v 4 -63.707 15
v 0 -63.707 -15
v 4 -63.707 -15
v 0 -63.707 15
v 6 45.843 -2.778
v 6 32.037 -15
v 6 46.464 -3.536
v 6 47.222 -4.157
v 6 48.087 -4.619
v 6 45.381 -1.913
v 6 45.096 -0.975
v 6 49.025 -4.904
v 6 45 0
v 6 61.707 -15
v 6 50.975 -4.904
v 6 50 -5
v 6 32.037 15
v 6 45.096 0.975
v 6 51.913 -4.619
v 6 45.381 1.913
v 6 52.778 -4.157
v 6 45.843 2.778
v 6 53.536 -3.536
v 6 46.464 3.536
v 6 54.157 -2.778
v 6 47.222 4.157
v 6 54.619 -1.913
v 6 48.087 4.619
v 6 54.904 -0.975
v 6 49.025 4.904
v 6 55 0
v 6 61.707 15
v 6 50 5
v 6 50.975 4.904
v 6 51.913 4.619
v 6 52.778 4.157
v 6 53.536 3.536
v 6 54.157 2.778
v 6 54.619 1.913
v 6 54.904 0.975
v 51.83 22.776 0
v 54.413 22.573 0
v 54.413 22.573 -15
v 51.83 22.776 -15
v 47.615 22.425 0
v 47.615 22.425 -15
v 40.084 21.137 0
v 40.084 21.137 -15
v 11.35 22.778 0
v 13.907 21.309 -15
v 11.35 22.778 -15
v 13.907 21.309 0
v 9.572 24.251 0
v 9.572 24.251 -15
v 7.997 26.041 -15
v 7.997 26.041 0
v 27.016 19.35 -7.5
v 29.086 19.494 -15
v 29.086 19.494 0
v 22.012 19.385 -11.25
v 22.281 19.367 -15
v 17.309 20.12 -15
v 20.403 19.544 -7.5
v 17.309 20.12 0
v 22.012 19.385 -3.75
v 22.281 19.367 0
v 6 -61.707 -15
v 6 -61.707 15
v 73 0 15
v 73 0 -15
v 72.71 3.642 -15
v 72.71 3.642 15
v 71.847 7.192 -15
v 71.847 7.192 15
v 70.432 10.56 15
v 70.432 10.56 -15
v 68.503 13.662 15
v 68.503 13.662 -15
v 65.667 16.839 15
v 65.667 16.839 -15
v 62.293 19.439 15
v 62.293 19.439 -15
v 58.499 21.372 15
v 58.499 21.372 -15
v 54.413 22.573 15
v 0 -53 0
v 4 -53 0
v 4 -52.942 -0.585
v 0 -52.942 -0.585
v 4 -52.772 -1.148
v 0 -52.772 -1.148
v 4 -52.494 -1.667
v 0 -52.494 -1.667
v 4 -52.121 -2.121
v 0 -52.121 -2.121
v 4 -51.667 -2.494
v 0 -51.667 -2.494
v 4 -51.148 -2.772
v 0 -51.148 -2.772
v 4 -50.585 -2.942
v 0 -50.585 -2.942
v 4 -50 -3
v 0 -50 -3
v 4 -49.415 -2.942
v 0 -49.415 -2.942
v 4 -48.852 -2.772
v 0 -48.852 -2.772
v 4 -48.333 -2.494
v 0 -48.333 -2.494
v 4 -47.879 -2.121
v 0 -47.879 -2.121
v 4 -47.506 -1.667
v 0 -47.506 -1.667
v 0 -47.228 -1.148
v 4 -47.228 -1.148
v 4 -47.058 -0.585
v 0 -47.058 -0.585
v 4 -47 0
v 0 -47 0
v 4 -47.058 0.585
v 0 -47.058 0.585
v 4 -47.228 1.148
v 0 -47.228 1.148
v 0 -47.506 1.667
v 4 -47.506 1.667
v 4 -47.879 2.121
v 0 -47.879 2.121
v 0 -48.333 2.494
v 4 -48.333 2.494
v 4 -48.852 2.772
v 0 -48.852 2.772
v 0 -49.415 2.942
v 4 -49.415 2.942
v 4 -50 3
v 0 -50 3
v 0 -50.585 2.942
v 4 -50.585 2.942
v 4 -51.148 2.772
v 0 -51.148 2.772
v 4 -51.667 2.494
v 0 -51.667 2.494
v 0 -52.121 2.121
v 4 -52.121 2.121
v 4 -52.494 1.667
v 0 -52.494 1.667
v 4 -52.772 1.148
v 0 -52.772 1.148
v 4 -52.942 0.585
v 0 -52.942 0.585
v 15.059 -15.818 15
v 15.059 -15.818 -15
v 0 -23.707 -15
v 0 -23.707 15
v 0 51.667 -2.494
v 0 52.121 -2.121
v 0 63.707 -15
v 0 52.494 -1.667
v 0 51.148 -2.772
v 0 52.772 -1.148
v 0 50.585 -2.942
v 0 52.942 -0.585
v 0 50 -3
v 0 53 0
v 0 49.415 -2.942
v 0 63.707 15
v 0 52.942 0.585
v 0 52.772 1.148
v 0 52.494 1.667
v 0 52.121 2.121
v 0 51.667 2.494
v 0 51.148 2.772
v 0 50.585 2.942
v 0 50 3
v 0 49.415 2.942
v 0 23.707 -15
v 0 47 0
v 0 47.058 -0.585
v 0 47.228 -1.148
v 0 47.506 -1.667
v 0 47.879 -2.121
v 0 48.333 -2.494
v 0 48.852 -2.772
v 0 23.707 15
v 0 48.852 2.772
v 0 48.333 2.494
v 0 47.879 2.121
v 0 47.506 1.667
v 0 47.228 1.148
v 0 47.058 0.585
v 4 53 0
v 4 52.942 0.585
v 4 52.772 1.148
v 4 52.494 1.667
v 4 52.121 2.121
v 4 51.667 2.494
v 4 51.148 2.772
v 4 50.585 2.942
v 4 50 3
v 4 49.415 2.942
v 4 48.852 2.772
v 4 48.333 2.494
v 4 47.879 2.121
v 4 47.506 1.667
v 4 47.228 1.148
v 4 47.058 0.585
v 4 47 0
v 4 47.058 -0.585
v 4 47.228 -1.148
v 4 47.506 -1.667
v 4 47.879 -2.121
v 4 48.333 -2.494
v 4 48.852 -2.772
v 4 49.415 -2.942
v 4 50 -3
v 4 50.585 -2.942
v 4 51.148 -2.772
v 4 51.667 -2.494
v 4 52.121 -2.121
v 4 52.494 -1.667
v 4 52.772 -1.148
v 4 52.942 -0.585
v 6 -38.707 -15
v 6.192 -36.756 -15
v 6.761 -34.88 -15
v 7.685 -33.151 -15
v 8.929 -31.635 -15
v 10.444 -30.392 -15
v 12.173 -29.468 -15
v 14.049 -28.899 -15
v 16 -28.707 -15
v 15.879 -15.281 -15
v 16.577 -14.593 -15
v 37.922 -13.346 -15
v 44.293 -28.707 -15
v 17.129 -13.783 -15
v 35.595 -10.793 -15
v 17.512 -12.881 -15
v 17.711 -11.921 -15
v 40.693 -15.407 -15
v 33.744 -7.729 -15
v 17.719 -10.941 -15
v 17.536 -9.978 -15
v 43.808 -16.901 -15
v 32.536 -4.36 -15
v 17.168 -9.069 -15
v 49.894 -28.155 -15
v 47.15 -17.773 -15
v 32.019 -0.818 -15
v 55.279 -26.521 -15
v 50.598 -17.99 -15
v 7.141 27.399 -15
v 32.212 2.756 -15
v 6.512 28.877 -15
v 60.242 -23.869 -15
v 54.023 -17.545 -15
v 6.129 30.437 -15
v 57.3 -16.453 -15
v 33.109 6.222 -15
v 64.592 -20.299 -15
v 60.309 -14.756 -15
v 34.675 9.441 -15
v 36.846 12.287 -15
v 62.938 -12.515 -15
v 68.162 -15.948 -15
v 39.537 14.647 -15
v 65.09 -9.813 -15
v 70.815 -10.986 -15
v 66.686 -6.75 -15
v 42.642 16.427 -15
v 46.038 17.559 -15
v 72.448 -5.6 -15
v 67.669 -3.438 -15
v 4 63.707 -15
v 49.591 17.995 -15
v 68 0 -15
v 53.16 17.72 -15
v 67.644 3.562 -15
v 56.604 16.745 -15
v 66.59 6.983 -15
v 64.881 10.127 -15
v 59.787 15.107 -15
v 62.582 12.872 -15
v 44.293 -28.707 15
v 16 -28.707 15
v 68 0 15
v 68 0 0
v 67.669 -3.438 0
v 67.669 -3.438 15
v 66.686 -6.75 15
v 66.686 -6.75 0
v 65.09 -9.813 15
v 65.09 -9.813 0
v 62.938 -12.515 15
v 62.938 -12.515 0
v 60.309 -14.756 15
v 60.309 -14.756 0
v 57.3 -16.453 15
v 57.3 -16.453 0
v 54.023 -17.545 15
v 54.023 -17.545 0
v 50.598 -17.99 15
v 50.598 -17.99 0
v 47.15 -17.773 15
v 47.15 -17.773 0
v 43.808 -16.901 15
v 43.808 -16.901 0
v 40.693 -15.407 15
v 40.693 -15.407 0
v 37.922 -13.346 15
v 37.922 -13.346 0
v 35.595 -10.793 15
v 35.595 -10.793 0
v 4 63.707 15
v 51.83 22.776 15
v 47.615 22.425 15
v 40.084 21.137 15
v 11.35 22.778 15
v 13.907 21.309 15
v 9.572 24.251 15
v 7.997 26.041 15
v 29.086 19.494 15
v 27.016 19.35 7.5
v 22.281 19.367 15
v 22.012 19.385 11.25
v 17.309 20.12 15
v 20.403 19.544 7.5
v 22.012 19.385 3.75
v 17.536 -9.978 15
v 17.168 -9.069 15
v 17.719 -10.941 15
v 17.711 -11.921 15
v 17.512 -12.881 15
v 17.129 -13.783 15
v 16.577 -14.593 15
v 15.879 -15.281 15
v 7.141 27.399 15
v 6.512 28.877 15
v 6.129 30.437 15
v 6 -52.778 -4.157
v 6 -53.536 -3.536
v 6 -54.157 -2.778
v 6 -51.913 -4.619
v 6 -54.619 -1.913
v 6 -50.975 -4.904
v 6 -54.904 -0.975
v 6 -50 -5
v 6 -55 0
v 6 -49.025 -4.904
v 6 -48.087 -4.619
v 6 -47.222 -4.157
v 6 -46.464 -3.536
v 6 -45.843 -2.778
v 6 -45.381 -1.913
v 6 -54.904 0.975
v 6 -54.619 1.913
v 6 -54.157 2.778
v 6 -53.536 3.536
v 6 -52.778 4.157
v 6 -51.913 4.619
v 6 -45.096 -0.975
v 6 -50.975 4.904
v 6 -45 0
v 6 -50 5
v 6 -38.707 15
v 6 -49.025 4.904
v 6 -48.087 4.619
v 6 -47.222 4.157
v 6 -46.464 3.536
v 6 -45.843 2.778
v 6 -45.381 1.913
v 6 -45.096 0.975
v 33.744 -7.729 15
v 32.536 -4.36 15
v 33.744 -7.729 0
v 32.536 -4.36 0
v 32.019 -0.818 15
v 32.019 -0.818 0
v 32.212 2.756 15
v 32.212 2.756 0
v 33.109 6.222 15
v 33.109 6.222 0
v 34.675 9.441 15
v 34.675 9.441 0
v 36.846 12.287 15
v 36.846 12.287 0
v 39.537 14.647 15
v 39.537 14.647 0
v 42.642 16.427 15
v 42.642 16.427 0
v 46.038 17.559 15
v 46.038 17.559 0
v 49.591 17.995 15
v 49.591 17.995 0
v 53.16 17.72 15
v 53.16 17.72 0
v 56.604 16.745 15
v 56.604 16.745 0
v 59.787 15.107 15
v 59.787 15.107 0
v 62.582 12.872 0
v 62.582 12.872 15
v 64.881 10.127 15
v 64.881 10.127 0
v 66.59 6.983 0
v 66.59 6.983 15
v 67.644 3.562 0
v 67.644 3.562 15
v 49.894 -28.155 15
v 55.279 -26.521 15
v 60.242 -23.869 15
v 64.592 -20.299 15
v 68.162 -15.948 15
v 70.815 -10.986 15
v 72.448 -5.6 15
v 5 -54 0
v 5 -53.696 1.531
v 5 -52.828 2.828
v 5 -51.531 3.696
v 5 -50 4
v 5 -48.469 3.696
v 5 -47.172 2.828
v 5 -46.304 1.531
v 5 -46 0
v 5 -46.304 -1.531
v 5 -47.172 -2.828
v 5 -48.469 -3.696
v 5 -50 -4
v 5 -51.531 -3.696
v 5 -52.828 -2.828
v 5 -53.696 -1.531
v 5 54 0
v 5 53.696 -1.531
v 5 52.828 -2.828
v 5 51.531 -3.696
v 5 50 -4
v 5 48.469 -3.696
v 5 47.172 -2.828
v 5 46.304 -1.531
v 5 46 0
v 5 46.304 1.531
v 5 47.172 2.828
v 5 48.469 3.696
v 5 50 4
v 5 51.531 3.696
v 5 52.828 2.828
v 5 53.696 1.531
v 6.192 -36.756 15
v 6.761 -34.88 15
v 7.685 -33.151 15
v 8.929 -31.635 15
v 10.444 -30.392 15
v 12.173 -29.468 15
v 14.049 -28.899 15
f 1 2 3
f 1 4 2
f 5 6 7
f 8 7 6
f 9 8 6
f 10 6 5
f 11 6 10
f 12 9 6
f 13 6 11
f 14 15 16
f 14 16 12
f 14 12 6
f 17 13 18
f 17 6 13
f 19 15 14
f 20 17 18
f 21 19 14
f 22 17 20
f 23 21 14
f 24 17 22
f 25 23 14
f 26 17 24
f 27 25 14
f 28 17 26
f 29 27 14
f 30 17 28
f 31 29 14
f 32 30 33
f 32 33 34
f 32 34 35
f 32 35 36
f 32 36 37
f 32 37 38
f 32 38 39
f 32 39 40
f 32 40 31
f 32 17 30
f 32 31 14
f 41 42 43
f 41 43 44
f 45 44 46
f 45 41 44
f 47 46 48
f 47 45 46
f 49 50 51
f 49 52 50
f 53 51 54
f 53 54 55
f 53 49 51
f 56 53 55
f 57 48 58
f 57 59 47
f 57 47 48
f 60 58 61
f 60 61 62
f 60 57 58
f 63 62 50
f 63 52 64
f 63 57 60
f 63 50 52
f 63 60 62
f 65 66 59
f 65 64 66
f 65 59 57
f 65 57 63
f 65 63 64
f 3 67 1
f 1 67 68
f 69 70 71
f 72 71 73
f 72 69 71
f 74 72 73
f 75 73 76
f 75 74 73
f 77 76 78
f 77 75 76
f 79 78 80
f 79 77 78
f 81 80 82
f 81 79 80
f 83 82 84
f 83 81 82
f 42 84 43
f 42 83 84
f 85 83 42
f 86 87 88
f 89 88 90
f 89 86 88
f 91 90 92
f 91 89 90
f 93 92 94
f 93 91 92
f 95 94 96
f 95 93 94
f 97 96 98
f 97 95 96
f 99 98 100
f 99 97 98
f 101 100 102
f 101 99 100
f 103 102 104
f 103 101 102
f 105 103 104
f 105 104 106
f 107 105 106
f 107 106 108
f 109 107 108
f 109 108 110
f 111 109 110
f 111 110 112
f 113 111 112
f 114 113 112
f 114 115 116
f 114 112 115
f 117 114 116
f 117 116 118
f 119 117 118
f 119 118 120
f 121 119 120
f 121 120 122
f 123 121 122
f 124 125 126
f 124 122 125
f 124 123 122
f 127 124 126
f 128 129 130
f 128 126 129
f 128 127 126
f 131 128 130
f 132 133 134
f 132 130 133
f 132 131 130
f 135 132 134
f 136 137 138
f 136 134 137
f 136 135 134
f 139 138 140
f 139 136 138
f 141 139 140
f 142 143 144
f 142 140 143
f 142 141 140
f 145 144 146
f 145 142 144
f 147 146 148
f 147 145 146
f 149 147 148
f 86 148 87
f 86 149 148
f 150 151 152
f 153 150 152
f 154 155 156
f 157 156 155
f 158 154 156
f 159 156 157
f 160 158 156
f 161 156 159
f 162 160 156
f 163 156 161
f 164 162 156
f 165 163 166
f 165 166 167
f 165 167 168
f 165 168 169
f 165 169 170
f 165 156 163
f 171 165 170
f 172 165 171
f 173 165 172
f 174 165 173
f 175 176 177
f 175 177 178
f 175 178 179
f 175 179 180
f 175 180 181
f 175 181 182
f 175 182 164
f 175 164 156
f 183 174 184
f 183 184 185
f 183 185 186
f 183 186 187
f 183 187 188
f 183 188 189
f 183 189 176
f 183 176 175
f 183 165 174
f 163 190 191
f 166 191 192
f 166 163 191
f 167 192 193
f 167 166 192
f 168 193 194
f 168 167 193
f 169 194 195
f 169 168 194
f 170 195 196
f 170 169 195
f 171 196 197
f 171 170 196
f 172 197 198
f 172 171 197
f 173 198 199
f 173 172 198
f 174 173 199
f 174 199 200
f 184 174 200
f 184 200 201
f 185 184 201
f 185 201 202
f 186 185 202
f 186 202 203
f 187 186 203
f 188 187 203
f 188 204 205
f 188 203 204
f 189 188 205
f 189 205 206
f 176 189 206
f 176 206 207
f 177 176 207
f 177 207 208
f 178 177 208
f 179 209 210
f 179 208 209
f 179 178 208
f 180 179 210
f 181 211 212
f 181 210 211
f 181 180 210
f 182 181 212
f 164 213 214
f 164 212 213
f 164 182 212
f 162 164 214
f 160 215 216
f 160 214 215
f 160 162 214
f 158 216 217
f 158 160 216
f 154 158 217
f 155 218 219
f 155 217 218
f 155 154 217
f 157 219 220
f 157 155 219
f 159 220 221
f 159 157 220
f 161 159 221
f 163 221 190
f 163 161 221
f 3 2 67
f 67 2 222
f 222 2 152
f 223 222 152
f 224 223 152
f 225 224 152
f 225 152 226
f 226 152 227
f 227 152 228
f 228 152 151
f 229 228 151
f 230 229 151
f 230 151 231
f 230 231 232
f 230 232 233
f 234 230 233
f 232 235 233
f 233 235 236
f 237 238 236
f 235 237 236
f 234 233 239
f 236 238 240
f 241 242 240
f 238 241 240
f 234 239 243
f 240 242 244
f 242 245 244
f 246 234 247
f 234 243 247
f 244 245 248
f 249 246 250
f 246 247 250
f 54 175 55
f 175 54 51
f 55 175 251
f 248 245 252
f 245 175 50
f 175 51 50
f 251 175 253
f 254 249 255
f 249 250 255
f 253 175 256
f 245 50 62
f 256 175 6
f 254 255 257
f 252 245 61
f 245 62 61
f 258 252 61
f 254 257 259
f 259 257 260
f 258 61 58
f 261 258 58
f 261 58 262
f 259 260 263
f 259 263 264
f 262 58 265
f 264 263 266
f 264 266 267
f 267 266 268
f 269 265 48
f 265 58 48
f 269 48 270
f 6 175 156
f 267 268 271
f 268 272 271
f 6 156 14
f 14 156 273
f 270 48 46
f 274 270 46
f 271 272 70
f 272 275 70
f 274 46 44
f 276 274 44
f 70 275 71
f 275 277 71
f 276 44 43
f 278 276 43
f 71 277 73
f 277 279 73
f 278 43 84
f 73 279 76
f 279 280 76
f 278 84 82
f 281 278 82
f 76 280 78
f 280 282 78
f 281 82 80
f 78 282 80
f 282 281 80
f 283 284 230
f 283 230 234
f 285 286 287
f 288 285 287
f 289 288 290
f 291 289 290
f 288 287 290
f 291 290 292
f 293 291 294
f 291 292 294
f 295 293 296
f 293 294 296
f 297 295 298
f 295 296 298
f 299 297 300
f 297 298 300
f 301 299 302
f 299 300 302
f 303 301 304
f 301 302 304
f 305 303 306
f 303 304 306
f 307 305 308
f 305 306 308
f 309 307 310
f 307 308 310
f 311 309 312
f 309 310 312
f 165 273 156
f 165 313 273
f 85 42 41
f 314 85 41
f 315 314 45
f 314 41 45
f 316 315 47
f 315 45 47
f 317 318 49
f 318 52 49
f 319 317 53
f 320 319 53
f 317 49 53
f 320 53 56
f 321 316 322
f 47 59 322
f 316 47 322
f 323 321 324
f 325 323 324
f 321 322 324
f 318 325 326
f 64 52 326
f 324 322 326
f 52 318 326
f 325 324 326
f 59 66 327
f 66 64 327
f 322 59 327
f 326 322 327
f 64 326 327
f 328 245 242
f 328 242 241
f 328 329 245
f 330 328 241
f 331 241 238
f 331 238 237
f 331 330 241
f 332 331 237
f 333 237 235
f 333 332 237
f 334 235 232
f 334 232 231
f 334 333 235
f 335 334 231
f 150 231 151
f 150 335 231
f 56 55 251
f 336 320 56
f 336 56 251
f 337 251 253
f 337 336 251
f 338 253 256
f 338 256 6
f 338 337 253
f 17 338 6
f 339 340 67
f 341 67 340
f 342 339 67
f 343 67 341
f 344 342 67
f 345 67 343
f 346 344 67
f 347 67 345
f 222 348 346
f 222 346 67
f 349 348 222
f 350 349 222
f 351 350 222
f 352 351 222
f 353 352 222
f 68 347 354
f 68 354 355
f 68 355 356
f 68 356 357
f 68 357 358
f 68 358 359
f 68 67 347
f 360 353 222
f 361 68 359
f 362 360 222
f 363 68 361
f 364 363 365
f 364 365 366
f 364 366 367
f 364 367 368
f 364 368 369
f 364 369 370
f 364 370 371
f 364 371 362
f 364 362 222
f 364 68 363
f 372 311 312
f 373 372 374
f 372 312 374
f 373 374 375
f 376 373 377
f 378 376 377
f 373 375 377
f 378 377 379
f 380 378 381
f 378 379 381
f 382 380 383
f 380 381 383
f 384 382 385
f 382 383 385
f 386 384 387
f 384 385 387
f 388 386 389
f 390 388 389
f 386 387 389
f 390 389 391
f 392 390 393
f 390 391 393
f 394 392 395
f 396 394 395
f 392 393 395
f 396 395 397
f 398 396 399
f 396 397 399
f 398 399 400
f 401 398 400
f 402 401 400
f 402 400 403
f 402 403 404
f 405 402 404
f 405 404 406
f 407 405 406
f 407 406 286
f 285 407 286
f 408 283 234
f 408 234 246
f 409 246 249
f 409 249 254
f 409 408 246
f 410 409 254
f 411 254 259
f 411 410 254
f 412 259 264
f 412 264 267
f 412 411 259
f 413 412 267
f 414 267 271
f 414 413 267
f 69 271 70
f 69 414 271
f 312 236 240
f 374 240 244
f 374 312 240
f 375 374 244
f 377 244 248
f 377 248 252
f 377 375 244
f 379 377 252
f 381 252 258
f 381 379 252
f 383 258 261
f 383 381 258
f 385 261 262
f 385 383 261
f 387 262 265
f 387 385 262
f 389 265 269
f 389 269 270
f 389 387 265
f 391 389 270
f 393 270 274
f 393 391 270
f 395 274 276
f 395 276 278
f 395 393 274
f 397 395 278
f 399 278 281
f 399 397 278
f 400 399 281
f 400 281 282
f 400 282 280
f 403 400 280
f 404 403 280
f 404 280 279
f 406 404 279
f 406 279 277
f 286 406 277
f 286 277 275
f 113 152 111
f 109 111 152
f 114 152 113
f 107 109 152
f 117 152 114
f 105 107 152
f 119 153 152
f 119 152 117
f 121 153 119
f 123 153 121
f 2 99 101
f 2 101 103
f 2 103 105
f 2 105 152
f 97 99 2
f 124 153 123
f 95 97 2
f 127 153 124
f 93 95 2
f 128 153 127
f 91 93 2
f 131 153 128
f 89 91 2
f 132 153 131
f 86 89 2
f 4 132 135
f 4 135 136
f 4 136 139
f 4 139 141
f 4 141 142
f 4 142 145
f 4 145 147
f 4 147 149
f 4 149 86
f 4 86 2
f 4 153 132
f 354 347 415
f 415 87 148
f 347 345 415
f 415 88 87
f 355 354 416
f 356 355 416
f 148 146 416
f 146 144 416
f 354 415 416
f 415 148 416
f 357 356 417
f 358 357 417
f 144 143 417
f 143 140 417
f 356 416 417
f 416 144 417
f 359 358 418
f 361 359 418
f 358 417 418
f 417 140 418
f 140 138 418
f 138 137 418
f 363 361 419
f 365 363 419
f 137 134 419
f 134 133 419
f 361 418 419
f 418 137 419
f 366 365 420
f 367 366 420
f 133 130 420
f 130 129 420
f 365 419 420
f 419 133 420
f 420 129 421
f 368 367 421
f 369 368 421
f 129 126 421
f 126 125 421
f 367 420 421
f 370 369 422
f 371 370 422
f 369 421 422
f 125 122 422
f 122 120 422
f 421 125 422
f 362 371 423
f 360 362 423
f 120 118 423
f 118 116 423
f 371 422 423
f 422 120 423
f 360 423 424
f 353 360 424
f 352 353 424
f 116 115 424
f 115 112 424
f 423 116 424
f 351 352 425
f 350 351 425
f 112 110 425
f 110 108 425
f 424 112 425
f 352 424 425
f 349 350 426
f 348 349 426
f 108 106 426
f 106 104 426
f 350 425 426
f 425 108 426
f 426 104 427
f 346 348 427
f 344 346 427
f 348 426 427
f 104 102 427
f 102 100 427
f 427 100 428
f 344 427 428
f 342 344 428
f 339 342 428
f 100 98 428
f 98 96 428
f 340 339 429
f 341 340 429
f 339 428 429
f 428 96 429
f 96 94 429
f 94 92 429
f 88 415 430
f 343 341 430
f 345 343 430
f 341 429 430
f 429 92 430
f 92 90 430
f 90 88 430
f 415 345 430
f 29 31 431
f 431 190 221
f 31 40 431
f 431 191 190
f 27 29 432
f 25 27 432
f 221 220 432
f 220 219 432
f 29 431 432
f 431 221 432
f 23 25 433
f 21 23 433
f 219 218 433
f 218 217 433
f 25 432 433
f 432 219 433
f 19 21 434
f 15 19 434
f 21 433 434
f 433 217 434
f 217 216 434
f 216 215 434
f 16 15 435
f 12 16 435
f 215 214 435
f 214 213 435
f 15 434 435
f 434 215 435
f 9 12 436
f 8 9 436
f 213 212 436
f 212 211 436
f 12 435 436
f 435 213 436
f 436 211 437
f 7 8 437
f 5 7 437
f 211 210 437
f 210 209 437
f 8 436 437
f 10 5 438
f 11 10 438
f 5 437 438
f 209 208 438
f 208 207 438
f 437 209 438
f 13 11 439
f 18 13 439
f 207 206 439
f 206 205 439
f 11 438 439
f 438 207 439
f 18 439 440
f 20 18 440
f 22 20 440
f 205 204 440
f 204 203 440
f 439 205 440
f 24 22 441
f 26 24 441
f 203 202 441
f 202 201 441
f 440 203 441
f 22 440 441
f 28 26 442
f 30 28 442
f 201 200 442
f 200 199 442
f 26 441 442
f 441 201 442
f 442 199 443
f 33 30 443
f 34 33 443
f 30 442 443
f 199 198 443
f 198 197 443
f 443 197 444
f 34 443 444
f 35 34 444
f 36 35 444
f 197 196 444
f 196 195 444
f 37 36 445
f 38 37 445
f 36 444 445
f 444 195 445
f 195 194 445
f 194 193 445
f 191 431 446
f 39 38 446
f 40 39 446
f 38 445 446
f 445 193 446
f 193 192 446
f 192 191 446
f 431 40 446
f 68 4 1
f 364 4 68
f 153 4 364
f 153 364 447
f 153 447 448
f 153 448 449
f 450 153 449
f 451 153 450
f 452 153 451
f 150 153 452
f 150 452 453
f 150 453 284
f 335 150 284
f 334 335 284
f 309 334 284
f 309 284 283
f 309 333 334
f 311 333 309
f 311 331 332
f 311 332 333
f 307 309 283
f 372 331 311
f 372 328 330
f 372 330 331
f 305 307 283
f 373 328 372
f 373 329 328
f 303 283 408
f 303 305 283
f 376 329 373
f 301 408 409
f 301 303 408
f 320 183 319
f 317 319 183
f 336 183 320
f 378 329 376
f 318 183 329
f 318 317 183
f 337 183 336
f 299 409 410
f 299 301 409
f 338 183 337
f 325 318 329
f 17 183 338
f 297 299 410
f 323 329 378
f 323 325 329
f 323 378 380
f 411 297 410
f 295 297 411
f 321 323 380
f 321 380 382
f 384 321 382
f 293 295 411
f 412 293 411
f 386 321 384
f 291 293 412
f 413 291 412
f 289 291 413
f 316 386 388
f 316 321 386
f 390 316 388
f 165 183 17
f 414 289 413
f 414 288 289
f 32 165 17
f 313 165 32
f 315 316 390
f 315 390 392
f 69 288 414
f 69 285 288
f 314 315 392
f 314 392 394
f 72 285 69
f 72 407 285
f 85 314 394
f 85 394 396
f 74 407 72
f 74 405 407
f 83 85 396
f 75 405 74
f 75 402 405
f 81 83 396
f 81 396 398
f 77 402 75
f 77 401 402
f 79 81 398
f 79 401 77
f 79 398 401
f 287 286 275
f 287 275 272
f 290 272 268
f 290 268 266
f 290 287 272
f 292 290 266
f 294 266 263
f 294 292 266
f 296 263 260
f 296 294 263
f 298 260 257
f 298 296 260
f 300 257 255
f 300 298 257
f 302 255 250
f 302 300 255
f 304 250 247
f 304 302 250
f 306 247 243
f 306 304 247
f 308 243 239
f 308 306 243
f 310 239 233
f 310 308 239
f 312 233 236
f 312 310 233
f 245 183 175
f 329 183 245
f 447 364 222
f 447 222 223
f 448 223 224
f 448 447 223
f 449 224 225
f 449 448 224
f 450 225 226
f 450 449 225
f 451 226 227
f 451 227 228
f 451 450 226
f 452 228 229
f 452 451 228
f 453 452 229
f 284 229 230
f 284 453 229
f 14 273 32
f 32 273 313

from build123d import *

# Parameters (mm, degrees)
BOSS_EXTRUDE2_DEPTH = 15
SKETCH7_R           = 3
CUT_EXTRUDE3_DEPTH  = 99.043475892
CHAMFER1_SIZE       = 2


with BuildPart() as part:
    # Sketch5 → Boss-Extrude2 (new, symmetric)
    with BuildSketch(Plane.XY):
        with BuildLine():
            Line((15.0591361, -15.818420273), (0, -23.706539182))
            Line((0, -23.706539182), (0, -63.706539182))
            Line((0, -63.706539182), (6, -63.706539182))
            Line((6, -63.706539182), (6, -38.706539182))
            ThreePointArc((6, -38.706539182), (8.928932188, -31.63547137), (16, -28.706539182))
            Line((16, -28.706539182), (44.293460818, -28.706539182))
            ThreePointArc((44.293460818, -28.706539182), (64.592049338, -20.29858852), (73, 0))
            ThreePointArc((73, 0), (71.8467278, 7.191695517), (68.502566573, 13.662175164))
            ThreePointArc((68.502566573, 13.662175164), (68.128388929, 12.868245276), (68, 12))
            Line((68, 12), (68, 0))
            ThreePointArc((68, 0), (55.687961475, -17.077678246), (35.594767305, -10.793019549))
            Line((35.594767305, -10.793019549), (7.997092947, 26.041058175))
            ThreePointArc((7.997092947, 26.041058175), (6.512400975, 28.87720155), (6, 32.037180147))
            Line((6, 32.037180147), (6, 63.706539182))
            Line((6, 63.706539182), (0, 63.706539182))
            Line((0, 63.706539182), (0, 23.706539182))
            Line((0, 23.706539182), (17.168258803, -9.069227623))
            ThreePointArc((17.168258803, -9.069227623), (17.511501017, -12.880637562), (15.0591361, -15.818420273))
        make_face()
        with BuildLine():
            ThreePointArc((68, 12), (68.128388929, 12.868245276), (68.502566573, 13.662175164))
            ThreePointArc((68.502566573, 13.662175164), (62.293432752, 19.438917438), (54.41285467, 22.572698413))
            add(Edge.make_bspline(
                [(54.41285467, 22.572698413), (48.698801755, 23.689768452), (29.182846067, 17.084288793), (12.266368885, 20.342938845), (7.997092947, 26.041058175)],
                knots=[0, 0, 0, 0, 0.577740896, 1, 1, 1, 1], degree=3))
            Line((7.997092947, 26.041058175), (35.594767305, -10.793019549))
            ThreePointArc((35.594767305, -10.793019549), (44.312038525, 17.077678246), (68, 0))
            Line((68, 0), (68, 12))
        make_face()
    extrude(amount=BOSS_EXTRUDE2_DEPTH, both=True)

    # Sketch7 → Cut-Extrude3 (cut, through all)
    with BuildSketch(Plane(origin=(0, 0, 0), x_dir=(0, 0, -1), z_dir=(1, 0, 0))):
        with Locations(Location((0, -50, 0), (0, 0, 270))):
            Circle(SKETCH7_R)
        with Locations(Location((0, 50, 0), (0, 0, 90))):
            Circle(SKETCH7_R)
    extrude(amount=CUT_EXTRUDE3_DEPTH, mode=Mode.SUBTRACT)

    # Chamfer1
    chamfer1_edges = [part.edges().sort_by_distance(p)[0] for p in [
        (6, -63.706539182, 0),
        (6, 63.706539182, 0),
        (6, -47, 0),
        (6, 47, 0),
    ]]
    chamfer(chamfer1_edges, length=CHAMFER1_SIZE)


solid = part.part
